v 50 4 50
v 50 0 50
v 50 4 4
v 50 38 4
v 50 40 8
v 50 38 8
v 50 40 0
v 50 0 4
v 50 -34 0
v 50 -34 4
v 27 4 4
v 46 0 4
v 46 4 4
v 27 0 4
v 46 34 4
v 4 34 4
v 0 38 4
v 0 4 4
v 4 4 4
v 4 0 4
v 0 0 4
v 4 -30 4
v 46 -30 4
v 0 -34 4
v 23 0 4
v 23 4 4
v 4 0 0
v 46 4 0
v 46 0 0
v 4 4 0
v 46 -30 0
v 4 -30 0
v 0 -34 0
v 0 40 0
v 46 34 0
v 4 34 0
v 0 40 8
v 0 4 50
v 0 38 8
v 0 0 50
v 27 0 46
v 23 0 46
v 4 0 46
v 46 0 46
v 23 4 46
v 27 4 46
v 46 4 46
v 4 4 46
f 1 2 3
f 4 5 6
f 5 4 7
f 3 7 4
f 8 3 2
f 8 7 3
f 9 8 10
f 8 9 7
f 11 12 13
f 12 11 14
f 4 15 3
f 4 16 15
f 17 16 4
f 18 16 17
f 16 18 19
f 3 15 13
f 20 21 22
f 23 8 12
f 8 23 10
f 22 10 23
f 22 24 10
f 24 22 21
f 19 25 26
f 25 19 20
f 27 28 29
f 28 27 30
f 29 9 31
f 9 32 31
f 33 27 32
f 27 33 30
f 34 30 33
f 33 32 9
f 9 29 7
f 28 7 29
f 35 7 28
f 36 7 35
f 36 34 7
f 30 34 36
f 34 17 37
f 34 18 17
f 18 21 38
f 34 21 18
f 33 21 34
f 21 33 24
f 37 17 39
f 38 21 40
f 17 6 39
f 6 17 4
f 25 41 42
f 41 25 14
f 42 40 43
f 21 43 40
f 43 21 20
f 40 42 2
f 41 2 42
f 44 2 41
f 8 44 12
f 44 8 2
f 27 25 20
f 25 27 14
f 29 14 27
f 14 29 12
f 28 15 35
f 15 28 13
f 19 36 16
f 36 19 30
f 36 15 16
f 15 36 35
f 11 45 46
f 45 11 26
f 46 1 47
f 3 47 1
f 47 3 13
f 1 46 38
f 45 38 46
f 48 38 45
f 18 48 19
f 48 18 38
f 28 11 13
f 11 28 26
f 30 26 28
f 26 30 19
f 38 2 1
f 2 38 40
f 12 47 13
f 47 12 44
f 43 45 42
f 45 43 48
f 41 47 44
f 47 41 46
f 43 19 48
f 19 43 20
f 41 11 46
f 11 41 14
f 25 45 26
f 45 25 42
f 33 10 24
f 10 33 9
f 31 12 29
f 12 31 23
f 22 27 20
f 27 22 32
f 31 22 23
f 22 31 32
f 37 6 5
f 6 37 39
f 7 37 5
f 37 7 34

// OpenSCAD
// Simple phone stand

l = 50;
w = 38; // l x w will be the size of the base
h = 50;  
th = 4; // thickness of the bouding pillars
eb = true; // extend base to back to prevent tip over. Not required if phone is placed only on the side (watch videos etc.) on the stand

// base of the stand
module base()
{
    difference()
    {
        cube ([l, w, th]);
        translate([th,th,0]) cube ([l - (th*2), w - (th*2) ,th]);
    }
}

// vertical back of the stand
module backside()
{
    difference()
    {
        cube([l, th, h]);
        translate([th,0,th]) cube([l-(th*2),th,h - (th*2)]);

    }
    // give additional colum support in the back so that printer does not need to draw long bridge
    translate([(l/2) - (th/2),0,0]) cube ([th,th,h]);
}  


//end stop
module endstop()
{
    translate([0,w,0]) cube([l,th/2,th*2]);
}

module extendbase()
{
    if (eb)
    {
    translate([0,-w + th,0]) base();
    }
}

base();
backside();
endstop();
extendbase();
